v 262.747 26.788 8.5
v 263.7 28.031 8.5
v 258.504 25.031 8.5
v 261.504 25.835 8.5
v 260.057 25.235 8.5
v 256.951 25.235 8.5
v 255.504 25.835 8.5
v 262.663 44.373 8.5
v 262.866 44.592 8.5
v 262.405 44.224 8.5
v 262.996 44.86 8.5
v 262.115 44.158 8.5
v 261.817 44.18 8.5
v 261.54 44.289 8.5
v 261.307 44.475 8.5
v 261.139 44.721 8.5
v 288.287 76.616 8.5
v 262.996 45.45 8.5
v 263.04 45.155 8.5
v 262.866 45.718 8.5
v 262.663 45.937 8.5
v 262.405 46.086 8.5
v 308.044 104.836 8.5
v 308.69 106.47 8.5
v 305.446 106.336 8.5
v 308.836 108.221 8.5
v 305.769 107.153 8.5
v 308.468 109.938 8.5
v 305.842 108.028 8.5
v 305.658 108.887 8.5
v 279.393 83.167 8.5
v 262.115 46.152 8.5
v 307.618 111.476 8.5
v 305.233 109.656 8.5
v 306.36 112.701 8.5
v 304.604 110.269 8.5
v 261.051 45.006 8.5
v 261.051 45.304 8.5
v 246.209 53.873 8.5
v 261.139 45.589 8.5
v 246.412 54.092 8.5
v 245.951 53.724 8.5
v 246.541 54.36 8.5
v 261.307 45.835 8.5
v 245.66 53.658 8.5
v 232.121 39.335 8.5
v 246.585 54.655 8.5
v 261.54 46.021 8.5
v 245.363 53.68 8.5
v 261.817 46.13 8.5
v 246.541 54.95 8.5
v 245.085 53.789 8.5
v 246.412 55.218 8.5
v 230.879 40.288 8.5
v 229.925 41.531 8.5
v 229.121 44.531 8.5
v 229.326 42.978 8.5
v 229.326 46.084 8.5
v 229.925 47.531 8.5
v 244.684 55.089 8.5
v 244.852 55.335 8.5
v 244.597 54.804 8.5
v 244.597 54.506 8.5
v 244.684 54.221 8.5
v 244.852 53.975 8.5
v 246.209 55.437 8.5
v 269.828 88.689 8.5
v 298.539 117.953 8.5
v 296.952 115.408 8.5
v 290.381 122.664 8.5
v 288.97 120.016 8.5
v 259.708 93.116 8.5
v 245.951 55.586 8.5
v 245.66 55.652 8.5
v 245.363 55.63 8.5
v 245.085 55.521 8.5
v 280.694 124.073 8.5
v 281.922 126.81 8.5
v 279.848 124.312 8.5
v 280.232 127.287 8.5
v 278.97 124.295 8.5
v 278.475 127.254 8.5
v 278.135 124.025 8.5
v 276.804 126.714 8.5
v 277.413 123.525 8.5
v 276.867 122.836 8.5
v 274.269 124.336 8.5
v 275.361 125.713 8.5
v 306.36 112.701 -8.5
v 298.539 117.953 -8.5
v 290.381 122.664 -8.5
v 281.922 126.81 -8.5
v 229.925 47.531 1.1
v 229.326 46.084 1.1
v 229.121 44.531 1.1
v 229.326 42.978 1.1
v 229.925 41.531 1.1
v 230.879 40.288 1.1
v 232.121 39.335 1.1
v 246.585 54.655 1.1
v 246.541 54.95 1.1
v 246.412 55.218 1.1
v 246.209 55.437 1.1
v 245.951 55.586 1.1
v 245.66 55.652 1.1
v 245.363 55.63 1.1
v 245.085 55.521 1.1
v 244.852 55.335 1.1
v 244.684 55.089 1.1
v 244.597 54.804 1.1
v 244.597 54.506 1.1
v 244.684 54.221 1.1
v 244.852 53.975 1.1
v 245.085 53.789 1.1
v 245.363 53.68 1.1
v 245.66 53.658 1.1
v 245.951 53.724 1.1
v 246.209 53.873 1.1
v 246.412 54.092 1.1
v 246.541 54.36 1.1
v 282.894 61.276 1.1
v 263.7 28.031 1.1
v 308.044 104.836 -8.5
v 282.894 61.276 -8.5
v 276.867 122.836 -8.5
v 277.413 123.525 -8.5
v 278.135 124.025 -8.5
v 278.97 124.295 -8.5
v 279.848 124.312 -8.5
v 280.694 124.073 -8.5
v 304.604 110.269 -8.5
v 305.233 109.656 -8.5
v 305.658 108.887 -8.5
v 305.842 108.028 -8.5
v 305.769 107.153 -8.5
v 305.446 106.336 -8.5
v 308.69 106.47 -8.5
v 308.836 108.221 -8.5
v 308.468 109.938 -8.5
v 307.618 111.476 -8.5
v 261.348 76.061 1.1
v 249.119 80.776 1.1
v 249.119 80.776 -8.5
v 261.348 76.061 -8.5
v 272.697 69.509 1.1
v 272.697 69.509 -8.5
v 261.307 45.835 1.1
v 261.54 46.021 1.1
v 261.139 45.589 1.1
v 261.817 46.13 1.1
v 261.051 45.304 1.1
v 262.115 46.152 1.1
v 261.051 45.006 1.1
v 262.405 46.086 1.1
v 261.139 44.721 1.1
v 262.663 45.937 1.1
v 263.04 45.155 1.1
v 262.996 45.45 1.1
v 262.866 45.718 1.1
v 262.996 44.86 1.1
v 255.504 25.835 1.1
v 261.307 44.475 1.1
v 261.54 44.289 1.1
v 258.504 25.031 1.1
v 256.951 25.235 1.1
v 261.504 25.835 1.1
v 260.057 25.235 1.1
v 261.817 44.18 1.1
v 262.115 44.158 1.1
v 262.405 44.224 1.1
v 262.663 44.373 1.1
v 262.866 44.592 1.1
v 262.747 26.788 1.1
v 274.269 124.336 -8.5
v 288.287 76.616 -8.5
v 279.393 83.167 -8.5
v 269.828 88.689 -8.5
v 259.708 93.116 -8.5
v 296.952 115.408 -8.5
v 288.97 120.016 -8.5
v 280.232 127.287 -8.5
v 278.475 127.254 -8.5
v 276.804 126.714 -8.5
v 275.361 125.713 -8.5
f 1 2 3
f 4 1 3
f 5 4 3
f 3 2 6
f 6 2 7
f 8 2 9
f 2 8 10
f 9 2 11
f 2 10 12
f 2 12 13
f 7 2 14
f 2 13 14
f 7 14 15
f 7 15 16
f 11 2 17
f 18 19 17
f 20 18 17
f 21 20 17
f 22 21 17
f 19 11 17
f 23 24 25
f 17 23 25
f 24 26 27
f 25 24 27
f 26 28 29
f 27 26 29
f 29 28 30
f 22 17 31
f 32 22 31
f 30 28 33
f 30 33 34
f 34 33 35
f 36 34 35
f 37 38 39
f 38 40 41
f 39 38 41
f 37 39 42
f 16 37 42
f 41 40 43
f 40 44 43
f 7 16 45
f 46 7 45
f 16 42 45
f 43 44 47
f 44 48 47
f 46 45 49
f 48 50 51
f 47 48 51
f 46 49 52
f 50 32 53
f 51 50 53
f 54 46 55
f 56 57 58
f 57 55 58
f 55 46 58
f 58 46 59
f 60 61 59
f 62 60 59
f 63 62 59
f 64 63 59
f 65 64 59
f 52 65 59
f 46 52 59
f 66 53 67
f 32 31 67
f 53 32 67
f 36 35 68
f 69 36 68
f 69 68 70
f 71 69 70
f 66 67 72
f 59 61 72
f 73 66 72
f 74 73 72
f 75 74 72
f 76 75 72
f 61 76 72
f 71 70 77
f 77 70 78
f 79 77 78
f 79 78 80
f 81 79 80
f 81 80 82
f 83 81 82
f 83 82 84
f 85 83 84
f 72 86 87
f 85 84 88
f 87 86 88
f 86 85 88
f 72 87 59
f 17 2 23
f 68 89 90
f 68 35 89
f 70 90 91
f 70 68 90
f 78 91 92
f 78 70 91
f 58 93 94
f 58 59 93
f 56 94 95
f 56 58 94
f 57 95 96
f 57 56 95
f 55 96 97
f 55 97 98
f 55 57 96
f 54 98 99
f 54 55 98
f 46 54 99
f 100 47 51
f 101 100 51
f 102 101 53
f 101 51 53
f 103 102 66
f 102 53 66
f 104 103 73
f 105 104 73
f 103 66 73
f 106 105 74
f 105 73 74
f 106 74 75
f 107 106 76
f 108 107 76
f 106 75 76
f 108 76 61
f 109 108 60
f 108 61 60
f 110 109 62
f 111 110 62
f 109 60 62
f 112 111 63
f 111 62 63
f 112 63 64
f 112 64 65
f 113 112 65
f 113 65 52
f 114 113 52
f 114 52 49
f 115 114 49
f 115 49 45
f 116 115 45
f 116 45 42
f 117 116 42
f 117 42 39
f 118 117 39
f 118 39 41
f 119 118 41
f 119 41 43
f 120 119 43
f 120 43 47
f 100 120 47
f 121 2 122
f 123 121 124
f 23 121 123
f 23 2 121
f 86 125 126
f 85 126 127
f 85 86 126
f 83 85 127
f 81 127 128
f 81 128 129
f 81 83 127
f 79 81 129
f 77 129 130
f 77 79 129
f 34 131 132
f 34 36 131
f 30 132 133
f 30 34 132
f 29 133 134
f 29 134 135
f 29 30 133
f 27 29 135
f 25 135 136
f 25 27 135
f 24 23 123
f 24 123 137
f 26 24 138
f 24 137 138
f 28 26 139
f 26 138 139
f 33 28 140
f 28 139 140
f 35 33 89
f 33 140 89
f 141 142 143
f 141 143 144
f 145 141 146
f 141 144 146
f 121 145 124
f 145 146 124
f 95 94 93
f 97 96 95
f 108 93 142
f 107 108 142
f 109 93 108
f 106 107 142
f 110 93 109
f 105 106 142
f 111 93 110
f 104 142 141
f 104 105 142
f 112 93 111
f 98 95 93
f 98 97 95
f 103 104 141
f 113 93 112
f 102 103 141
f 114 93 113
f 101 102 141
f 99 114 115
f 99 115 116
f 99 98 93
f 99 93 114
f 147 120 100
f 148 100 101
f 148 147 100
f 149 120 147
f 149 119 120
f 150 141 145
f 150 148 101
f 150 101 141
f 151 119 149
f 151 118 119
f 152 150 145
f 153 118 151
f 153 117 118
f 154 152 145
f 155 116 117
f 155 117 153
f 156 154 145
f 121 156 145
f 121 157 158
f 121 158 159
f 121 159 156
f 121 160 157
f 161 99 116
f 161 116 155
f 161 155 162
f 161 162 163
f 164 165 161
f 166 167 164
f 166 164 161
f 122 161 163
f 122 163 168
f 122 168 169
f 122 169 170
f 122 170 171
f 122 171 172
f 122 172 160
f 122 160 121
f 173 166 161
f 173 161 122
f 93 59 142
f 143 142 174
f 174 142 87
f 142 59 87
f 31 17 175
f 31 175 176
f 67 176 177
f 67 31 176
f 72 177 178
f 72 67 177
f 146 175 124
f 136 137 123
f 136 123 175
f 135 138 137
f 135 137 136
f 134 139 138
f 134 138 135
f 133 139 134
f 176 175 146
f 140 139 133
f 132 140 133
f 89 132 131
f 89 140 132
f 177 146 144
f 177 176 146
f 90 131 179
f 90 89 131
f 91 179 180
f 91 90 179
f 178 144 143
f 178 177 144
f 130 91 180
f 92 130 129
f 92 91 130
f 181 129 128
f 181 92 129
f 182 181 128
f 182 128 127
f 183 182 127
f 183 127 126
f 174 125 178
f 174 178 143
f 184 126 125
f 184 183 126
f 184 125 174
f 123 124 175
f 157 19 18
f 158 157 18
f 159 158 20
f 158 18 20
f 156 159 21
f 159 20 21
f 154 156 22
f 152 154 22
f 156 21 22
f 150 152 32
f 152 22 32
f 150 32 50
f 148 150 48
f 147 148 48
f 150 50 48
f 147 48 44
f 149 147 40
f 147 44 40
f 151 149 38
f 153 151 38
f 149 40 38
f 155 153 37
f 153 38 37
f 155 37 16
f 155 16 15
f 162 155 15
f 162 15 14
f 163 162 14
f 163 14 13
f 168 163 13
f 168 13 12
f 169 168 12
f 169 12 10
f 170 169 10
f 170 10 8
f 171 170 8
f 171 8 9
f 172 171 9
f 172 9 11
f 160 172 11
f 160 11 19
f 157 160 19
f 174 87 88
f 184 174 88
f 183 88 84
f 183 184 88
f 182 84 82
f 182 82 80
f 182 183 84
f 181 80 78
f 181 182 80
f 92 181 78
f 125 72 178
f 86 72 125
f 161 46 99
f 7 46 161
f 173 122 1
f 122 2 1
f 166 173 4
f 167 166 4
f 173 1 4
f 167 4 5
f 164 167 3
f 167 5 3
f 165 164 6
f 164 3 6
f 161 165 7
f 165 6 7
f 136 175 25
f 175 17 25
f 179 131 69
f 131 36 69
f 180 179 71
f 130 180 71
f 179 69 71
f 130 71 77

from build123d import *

# Parameters (mm, degrees)
PAD018_DEPTH    = 8.5
FILLET008_R     = 6
FILLET009_R     = 3
SKETCH032_R     = 84.3
POCKET021_DEPTH = 9.6
SKETCH033_R     = 1
POCKET022_DEPTH = 17.001
FILLET010_R     = 6


with BuildPart() as part:
    # Sketch031 → Pad018 (new body, symmetric)
    with BuildSketch(Plane.XY):
        with BuildLine():
            Line((226.925203, 42.33455), (276.925203, 128.93709))
            ThreePointArc((310.700194, 109.43709), (294.5, 120.377531), (276.925203, 128.93709))
            Line((260.700194, 22.83455), (310.700194, 109.43709))
            Line((226.925203, 42.33455), (260.700194, 22.83455))
        make_face()
        with BuildLine():
            Line((259.708266, 93.11648), (278.208266, 125.15942))
            ThreePointArc((306.787104, 108.65942), (293, 117.779455), (278.208266, 125.15942))
            Line((288.287104, 76.61648), (306.787104, 108.65942))
            ThreePointArc((288.287104, 76.61648), (274.687379, 86.061065), (259.708266, 93.11648))
        make_face(mode=Mode.SUBTRACT)
    extrude(amount=PAD018_DEPTH, both=True)

    # Fillet008
    fillet008_edges = [part.edges().sort_by_distance(p)[0] for p in [
        (310.700194, 109.43709, 0),
        (276.925203, 128.93709, 0),
    ]]
    fillet(fillet008_edges, radius=FILLET008_R)

    # Fillet009
    fillet009_edges = [part.edges().sort_by_distance(p)[0] for p in [
        (278.208266, 125.15942, 0),
        (306.787104, 108.65942, 0),
    ]]
    fillet(fillet009_edges, radius=FILLET009_R)

    # Sketch032 (on Face1 of Fillet009) → Pocket021 (cut)
    with BuildSketch(Plane(origin=(0, 0, -8.5), x_dir=(1, 0, 0), z_dir=(0, 0, -1))):
        with Locations((225, 0)):
            Circle(SKETCH032_R)
    extrude(amount=-POCKET021_DEPTH, mode=Mode.SUBTRACT)

    # Sketch033 (on Face15 of Pocket021) → Pocket022 (cut, through all)
    with BuildSketch(Plane.XY.offset(8.5)):
        with Locations((245.585457, 54.655058)):
            Circle(SKETCH033_R)
        with Locations((262.03994, 45.155058)):
            Circle(SKETCH033_R)
    extrude(amount=-POCKET022_DEPTH, mode=Mode.SUBTRACT)

    # Fillet010
    fillet010_edges = [part.edges().sort_by_distance(p)[0] for p in [
        (226.925203, 42.33455, 4.8),
        (260.700194, 22.83455, 4.8),
    ]]
    fillet(fillet010_edges, radius=FILLET010_R)


solid = part.part
